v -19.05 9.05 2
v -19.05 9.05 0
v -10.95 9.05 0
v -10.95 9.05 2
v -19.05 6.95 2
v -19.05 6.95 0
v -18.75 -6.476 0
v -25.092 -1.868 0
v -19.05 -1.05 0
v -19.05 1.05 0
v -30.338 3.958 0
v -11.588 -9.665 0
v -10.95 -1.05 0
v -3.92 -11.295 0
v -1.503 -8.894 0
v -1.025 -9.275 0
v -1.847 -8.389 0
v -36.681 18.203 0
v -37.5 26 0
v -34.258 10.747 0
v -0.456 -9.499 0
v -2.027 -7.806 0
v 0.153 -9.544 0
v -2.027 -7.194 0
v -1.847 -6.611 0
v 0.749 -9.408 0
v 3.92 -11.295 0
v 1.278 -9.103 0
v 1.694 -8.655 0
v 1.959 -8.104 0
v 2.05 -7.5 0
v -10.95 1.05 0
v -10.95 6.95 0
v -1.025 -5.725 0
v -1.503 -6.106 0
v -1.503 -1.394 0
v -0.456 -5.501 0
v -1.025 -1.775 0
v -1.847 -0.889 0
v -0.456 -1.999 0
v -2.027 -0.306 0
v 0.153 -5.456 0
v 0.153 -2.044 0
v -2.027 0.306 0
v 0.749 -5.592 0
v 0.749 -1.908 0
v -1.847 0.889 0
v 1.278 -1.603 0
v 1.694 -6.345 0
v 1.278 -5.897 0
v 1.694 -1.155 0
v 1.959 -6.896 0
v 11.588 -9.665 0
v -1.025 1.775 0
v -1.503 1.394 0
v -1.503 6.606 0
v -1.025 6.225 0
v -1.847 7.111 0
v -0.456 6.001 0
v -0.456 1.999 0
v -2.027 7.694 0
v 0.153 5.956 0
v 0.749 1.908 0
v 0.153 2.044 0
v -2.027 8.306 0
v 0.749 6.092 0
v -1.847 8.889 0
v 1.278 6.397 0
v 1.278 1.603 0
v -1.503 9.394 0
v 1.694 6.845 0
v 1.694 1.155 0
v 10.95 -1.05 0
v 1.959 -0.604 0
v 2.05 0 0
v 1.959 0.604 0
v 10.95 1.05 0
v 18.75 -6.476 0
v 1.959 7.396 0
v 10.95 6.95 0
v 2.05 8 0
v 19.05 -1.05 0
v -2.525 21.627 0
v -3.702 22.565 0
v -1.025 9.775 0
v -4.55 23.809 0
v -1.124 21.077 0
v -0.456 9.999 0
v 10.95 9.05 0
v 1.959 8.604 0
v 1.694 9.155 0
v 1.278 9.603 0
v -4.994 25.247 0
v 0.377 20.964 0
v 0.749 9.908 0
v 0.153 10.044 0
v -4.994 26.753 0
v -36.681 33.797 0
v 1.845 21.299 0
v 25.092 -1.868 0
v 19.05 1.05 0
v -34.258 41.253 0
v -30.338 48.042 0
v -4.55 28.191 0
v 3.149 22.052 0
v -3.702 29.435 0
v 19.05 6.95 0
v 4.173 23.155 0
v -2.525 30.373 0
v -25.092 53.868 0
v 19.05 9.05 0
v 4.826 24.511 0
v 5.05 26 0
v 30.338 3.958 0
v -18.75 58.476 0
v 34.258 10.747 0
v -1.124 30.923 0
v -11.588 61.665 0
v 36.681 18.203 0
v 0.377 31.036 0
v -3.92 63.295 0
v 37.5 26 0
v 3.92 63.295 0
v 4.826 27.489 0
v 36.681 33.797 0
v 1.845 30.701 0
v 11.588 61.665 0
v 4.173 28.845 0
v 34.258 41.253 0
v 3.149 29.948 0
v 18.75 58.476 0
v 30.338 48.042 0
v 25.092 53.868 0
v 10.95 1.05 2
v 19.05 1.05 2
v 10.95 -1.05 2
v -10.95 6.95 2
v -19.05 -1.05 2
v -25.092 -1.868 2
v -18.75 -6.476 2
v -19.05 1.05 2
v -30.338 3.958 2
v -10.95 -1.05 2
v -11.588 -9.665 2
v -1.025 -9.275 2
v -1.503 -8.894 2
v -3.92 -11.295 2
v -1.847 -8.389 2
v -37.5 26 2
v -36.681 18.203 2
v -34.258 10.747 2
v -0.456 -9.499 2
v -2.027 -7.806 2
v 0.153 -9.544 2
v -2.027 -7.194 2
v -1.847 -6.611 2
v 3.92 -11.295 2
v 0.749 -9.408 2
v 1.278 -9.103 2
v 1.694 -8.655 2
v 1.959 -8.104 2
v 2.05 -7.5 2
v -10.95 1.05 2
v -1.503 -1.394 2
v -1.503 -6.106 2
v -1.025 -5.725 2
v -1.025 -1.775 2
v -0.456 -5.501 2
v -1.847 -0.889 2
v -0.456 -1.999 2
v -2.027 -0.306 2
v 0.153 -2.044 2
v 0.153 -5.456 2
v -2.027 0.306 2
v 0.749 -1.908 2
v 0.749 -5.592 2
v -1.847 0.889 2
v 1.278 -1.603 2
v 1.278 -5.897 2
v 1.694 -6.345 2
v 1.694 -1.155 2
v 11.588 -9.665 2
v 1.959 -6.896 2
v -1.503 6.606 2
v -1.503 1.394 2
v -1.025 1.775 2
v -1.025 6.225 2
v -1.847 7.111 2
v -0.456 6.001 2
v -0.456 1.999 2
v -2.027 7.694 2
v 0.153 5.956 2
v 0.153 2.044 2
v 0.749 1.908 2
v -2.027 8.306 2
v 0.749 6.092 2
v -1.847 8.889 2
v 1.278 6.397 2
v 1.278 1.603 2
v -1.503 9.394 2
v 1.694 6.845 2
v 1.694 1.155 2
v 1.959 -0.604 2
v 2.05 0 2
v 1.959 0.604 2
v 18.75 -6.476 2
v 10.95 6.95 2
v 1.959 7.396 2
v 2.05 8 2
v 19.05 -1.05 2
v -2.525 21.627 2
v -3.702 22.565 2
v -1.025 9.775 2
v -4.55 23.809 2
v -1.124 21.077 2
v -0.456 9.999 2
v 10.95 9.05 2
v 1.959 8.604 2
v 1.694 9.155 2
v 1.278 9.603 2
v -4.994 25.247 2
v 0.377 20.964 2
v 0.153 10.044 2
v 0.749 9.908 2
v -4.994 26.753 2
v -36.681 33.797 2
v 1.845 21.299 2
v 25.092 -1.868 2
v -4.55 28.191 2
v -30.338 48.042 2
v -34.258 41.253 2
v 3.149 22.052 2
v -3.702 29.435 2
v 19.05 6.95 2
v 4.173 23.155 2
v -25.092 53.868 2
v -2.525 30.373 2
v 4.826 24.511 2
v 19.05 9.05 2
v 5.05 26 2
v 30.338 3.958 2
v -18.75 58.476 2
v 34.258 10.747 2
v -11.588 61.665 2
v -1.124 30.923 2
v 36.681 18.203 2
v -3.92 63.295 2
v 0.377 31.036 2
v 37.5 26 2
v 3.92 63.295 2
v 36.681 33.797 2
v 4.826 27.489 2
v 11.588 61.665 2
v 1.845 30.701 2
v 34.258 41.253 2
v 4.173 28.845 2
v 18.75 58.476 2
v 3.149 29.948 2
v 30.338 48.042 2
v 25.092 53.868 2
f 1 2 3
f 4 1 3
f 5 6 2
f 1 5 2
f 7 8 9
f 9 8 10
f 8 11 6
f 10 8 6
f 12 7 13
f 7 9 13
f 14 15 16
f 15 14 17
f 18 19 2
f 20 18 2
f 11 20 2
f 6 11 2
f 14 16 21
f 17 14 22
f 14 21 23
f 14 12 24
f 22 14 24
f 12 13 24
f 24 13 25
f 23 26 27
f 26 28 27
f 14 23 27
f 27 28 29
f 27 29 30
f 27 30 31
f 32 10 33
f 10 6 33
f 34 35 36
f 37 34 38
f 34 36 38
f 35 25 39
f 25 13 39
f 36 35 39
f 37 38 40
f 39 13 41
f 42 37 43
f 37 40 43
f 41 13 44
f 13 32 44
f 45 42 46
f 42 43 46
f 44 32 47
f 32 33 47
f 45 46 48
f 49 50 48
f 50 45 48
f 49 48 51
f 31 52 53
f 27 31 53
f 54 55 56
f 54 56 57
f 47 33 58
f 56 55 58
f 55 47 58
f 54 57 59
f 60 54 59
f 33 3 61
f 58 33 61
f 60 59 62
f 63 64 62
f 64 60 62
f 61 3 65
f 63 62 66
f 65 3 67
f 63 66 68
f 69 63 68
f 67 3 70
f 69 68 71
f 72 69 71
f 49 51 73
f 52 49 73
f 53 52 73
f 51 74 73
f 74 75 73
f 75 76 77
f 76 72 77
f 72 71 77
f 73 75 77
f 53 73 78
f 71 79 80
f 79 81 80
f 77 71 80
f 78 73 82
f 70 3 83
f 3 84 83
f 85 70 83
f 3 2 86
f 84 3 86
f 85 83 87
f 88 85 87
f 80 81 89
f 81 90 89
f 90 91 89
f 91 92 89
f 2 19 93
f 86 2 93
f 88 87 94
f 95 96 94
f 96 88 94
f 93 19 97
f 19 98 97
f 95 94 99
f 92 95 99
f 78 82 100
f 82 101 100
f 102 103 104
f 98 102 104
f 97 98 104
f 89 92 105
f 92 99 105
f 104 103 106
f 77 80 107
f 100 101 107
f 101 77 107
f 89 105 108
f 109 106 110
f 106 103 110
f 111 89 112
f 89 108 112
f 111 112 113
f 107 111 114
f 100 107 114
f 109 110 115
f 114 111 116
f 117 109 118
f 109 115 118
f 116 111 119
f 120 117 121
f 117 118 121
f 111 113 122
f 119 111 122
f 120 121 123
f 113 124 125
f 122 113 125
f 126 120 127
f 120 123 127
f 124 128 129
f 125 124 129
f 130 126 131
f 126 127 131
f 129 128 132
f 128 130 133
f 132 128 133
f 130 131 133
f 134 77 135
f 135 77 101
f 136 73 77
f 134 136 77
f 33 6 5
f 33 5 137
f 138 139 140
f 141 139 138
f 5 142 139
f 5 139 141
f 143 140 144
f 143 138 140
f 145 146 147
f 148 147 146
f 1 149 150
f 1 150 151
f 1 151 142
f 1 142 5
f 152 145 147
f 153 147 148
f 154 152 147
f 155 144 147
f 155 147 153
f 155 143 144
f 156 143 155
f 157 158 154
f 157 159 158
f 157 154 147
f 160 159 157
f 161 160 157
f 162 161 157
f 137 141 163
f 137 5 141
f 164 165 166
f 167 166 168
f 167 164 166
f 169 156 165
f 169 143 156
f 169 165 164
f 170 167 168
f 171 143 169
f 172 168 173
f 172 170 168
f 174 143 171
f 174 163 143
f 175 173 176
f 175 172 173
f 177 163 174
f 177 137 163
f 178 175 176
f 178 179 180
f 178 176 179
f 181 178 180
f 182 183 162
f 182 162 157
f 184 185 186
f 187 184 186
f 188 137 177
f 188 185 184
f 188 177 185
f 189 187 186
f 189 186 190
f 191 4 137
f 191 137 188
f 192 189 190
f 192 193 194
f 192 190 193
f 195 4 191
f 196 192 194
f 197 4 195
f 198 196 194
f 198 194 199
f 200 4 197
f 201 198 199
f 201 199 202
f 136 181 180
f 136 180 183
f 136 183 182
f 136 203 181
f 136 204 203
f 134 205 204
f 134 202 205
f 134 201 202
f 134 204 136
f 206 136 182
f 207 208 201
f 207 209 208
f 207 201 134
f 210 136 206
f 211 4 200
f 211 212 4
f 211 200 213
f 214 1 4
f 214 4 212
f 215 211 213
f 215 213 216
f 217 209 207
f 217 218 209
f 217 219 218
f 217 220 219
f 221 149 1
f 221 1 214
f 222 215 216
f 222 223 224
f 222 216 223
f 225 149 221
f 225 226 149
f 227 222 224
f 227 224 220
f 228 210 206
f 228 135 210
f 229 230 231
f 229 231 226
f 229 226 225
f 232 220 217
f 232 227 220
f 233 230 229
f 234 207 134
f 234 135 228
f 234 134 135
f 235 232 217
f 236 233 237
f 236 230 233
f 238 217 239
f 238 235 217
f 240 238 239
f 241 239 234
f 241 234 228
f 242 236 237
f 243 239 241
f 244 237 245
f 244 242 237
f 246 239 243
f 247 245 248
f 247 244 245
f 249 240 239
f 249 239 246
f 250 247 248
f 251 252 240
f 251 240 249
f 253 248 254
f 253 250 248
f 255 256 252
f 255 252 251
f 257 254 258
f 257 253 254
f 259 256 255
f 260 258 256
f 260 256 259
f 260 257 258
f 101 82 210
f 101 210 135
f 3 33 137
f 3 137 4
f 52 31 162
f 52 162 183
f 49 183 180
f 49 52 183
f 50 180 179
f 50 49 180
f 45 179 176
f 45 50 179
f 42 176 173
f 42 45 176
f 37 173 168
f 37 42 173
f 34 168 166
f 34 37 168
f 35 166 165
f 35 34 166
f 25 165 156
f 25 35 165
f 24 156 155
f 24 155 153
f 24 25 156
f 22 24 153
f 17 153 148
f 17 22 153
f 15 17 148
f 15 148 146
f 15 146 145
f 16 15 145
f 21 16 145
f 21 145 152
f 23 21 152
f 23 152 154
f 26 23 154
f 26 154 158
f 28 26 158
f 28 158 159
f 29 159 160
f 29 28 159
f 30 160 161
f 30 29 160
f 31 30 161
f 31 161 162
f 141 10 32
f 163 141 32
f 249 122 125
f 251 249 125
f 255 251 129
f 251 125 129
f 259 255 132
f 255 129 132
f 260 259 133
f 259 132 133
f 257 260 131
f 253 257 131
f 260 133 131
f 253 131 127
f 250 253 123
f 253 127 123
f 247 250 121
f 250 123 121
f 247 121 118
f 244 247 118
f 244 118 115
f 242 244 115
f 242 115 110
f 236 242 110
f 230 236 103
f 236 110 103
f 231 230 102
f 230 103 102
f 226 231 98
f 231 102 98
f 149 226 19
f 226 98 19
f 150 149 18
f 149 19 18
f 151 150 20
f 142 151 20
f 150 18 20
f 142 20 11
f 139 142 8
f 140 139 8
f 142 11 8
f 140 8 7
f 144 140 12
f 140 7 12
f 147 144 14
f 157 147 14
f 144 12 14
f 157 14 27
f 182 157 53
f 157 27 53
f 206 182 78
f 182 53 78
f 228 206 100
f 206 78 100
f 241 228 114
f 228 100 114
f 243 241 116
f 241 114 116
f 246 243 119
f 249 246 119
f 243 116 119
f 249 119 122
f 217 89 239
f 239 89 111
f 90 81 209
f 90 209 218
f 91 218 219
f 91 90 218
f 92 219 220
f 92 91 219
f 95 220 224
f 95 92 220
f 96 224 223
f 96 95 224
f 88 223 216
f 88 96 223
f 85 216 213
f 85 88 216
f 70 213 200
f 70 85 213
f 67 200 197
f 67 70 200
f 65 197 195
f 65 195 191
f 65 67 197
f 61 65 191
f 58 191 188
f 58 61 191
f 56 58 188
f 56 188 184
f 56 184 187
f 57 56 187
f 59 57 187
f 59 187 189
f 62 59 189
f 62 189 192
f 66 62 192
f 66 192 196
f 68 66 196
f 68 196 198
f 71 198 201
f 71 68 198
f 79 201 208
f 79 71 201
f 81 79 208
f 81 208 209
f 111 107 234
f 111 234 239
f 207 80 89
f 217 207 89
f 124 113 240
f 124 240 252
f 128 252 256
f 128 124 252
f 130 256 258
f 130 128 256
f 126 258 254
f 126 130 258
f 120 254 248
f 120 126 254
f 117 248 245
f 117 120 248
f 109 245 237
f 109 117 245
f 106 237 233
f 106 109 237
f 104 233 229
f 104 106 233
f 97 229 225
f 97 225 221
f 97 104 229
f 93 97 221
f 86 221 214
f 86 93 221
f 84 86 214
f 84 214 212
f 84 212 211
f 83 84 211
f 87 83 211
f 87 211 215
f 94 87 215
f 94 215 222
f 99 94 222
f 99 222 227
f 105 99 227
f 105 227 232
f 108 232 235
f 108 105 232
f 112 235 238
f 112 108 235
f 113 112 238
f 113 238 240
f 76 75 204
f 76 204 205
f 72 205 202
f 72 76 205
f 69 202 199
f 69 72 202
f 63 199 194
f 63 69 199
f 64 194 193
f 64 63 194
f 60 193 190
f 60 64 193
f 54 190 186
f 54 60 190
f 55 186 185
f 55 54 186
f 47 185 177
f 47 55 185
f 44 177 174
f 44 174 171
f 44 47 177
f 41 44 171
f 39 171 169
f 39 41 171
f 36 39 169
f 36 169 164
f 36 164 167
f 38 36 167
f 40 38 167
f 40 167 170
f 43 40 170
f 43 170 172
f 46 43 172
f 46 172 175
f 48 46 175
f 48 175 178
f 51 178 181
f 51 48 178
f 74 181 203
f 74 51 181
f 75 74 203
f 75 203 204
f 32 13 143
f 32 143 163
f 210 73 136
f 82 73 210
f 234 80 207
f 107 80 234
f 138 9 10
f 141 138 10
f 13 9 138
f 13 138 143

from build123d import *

# Parameters (mm, degrees)
SKETCH_1_R      = 37.5
SKETCH_1_R_2    = 2.05
SKETCH_1_R_3    = 5.05
SKETCH_1_W      = 8.1
SKETCH_1_H      = 2.1
EXTRUDE_1_DEPTH = 2


with BuildPart() as part:
    # 草图1 → 凸台-拉伸1 (new body)
    with BuildSketch(Plane.XY):
        with Locations((0, 26)):
            Circle(SKETCH_1_R)
        Circle(SKETCH_1_R_2, mode=Mode.SUBTRACT)
        with Locations((0, 8)):
            Circle(SKETCH_1_R_2, mode=Mode.SUBTRACT)
        with Locations((0, 26)):
            Circle(SKETCH_1_R_3, mode=Mode.SUBTRACT)
        with Locations((0, -7.5)):
            Circle(SKETCH_1_R_2, mode=Mode.SUBTRACT)
        with Locations((-15, 8)):
            Rectangle(SKETCH_1_W, SKETCH_1_H, mode=Mode.SUBTRACT)
        with Locations((-15, 0)):
            Rectangle(SKETCH_1_W, SKETCH_1_H, mode=Mode.SUBTRACT)
        with Locations((15, 8)):
            Rectangle(SKETCH_1_W, SKETCH_1_H, mode=Mode.SUBTRACT)
        with Locations((15, 0)):
            Rectangle(SKETCH_1_W, SKETCH_1_H, mode=Mode.SUBTRACT)
    extrude(amount=EXTRUDE_1_DEPTH)


solid = part.part
